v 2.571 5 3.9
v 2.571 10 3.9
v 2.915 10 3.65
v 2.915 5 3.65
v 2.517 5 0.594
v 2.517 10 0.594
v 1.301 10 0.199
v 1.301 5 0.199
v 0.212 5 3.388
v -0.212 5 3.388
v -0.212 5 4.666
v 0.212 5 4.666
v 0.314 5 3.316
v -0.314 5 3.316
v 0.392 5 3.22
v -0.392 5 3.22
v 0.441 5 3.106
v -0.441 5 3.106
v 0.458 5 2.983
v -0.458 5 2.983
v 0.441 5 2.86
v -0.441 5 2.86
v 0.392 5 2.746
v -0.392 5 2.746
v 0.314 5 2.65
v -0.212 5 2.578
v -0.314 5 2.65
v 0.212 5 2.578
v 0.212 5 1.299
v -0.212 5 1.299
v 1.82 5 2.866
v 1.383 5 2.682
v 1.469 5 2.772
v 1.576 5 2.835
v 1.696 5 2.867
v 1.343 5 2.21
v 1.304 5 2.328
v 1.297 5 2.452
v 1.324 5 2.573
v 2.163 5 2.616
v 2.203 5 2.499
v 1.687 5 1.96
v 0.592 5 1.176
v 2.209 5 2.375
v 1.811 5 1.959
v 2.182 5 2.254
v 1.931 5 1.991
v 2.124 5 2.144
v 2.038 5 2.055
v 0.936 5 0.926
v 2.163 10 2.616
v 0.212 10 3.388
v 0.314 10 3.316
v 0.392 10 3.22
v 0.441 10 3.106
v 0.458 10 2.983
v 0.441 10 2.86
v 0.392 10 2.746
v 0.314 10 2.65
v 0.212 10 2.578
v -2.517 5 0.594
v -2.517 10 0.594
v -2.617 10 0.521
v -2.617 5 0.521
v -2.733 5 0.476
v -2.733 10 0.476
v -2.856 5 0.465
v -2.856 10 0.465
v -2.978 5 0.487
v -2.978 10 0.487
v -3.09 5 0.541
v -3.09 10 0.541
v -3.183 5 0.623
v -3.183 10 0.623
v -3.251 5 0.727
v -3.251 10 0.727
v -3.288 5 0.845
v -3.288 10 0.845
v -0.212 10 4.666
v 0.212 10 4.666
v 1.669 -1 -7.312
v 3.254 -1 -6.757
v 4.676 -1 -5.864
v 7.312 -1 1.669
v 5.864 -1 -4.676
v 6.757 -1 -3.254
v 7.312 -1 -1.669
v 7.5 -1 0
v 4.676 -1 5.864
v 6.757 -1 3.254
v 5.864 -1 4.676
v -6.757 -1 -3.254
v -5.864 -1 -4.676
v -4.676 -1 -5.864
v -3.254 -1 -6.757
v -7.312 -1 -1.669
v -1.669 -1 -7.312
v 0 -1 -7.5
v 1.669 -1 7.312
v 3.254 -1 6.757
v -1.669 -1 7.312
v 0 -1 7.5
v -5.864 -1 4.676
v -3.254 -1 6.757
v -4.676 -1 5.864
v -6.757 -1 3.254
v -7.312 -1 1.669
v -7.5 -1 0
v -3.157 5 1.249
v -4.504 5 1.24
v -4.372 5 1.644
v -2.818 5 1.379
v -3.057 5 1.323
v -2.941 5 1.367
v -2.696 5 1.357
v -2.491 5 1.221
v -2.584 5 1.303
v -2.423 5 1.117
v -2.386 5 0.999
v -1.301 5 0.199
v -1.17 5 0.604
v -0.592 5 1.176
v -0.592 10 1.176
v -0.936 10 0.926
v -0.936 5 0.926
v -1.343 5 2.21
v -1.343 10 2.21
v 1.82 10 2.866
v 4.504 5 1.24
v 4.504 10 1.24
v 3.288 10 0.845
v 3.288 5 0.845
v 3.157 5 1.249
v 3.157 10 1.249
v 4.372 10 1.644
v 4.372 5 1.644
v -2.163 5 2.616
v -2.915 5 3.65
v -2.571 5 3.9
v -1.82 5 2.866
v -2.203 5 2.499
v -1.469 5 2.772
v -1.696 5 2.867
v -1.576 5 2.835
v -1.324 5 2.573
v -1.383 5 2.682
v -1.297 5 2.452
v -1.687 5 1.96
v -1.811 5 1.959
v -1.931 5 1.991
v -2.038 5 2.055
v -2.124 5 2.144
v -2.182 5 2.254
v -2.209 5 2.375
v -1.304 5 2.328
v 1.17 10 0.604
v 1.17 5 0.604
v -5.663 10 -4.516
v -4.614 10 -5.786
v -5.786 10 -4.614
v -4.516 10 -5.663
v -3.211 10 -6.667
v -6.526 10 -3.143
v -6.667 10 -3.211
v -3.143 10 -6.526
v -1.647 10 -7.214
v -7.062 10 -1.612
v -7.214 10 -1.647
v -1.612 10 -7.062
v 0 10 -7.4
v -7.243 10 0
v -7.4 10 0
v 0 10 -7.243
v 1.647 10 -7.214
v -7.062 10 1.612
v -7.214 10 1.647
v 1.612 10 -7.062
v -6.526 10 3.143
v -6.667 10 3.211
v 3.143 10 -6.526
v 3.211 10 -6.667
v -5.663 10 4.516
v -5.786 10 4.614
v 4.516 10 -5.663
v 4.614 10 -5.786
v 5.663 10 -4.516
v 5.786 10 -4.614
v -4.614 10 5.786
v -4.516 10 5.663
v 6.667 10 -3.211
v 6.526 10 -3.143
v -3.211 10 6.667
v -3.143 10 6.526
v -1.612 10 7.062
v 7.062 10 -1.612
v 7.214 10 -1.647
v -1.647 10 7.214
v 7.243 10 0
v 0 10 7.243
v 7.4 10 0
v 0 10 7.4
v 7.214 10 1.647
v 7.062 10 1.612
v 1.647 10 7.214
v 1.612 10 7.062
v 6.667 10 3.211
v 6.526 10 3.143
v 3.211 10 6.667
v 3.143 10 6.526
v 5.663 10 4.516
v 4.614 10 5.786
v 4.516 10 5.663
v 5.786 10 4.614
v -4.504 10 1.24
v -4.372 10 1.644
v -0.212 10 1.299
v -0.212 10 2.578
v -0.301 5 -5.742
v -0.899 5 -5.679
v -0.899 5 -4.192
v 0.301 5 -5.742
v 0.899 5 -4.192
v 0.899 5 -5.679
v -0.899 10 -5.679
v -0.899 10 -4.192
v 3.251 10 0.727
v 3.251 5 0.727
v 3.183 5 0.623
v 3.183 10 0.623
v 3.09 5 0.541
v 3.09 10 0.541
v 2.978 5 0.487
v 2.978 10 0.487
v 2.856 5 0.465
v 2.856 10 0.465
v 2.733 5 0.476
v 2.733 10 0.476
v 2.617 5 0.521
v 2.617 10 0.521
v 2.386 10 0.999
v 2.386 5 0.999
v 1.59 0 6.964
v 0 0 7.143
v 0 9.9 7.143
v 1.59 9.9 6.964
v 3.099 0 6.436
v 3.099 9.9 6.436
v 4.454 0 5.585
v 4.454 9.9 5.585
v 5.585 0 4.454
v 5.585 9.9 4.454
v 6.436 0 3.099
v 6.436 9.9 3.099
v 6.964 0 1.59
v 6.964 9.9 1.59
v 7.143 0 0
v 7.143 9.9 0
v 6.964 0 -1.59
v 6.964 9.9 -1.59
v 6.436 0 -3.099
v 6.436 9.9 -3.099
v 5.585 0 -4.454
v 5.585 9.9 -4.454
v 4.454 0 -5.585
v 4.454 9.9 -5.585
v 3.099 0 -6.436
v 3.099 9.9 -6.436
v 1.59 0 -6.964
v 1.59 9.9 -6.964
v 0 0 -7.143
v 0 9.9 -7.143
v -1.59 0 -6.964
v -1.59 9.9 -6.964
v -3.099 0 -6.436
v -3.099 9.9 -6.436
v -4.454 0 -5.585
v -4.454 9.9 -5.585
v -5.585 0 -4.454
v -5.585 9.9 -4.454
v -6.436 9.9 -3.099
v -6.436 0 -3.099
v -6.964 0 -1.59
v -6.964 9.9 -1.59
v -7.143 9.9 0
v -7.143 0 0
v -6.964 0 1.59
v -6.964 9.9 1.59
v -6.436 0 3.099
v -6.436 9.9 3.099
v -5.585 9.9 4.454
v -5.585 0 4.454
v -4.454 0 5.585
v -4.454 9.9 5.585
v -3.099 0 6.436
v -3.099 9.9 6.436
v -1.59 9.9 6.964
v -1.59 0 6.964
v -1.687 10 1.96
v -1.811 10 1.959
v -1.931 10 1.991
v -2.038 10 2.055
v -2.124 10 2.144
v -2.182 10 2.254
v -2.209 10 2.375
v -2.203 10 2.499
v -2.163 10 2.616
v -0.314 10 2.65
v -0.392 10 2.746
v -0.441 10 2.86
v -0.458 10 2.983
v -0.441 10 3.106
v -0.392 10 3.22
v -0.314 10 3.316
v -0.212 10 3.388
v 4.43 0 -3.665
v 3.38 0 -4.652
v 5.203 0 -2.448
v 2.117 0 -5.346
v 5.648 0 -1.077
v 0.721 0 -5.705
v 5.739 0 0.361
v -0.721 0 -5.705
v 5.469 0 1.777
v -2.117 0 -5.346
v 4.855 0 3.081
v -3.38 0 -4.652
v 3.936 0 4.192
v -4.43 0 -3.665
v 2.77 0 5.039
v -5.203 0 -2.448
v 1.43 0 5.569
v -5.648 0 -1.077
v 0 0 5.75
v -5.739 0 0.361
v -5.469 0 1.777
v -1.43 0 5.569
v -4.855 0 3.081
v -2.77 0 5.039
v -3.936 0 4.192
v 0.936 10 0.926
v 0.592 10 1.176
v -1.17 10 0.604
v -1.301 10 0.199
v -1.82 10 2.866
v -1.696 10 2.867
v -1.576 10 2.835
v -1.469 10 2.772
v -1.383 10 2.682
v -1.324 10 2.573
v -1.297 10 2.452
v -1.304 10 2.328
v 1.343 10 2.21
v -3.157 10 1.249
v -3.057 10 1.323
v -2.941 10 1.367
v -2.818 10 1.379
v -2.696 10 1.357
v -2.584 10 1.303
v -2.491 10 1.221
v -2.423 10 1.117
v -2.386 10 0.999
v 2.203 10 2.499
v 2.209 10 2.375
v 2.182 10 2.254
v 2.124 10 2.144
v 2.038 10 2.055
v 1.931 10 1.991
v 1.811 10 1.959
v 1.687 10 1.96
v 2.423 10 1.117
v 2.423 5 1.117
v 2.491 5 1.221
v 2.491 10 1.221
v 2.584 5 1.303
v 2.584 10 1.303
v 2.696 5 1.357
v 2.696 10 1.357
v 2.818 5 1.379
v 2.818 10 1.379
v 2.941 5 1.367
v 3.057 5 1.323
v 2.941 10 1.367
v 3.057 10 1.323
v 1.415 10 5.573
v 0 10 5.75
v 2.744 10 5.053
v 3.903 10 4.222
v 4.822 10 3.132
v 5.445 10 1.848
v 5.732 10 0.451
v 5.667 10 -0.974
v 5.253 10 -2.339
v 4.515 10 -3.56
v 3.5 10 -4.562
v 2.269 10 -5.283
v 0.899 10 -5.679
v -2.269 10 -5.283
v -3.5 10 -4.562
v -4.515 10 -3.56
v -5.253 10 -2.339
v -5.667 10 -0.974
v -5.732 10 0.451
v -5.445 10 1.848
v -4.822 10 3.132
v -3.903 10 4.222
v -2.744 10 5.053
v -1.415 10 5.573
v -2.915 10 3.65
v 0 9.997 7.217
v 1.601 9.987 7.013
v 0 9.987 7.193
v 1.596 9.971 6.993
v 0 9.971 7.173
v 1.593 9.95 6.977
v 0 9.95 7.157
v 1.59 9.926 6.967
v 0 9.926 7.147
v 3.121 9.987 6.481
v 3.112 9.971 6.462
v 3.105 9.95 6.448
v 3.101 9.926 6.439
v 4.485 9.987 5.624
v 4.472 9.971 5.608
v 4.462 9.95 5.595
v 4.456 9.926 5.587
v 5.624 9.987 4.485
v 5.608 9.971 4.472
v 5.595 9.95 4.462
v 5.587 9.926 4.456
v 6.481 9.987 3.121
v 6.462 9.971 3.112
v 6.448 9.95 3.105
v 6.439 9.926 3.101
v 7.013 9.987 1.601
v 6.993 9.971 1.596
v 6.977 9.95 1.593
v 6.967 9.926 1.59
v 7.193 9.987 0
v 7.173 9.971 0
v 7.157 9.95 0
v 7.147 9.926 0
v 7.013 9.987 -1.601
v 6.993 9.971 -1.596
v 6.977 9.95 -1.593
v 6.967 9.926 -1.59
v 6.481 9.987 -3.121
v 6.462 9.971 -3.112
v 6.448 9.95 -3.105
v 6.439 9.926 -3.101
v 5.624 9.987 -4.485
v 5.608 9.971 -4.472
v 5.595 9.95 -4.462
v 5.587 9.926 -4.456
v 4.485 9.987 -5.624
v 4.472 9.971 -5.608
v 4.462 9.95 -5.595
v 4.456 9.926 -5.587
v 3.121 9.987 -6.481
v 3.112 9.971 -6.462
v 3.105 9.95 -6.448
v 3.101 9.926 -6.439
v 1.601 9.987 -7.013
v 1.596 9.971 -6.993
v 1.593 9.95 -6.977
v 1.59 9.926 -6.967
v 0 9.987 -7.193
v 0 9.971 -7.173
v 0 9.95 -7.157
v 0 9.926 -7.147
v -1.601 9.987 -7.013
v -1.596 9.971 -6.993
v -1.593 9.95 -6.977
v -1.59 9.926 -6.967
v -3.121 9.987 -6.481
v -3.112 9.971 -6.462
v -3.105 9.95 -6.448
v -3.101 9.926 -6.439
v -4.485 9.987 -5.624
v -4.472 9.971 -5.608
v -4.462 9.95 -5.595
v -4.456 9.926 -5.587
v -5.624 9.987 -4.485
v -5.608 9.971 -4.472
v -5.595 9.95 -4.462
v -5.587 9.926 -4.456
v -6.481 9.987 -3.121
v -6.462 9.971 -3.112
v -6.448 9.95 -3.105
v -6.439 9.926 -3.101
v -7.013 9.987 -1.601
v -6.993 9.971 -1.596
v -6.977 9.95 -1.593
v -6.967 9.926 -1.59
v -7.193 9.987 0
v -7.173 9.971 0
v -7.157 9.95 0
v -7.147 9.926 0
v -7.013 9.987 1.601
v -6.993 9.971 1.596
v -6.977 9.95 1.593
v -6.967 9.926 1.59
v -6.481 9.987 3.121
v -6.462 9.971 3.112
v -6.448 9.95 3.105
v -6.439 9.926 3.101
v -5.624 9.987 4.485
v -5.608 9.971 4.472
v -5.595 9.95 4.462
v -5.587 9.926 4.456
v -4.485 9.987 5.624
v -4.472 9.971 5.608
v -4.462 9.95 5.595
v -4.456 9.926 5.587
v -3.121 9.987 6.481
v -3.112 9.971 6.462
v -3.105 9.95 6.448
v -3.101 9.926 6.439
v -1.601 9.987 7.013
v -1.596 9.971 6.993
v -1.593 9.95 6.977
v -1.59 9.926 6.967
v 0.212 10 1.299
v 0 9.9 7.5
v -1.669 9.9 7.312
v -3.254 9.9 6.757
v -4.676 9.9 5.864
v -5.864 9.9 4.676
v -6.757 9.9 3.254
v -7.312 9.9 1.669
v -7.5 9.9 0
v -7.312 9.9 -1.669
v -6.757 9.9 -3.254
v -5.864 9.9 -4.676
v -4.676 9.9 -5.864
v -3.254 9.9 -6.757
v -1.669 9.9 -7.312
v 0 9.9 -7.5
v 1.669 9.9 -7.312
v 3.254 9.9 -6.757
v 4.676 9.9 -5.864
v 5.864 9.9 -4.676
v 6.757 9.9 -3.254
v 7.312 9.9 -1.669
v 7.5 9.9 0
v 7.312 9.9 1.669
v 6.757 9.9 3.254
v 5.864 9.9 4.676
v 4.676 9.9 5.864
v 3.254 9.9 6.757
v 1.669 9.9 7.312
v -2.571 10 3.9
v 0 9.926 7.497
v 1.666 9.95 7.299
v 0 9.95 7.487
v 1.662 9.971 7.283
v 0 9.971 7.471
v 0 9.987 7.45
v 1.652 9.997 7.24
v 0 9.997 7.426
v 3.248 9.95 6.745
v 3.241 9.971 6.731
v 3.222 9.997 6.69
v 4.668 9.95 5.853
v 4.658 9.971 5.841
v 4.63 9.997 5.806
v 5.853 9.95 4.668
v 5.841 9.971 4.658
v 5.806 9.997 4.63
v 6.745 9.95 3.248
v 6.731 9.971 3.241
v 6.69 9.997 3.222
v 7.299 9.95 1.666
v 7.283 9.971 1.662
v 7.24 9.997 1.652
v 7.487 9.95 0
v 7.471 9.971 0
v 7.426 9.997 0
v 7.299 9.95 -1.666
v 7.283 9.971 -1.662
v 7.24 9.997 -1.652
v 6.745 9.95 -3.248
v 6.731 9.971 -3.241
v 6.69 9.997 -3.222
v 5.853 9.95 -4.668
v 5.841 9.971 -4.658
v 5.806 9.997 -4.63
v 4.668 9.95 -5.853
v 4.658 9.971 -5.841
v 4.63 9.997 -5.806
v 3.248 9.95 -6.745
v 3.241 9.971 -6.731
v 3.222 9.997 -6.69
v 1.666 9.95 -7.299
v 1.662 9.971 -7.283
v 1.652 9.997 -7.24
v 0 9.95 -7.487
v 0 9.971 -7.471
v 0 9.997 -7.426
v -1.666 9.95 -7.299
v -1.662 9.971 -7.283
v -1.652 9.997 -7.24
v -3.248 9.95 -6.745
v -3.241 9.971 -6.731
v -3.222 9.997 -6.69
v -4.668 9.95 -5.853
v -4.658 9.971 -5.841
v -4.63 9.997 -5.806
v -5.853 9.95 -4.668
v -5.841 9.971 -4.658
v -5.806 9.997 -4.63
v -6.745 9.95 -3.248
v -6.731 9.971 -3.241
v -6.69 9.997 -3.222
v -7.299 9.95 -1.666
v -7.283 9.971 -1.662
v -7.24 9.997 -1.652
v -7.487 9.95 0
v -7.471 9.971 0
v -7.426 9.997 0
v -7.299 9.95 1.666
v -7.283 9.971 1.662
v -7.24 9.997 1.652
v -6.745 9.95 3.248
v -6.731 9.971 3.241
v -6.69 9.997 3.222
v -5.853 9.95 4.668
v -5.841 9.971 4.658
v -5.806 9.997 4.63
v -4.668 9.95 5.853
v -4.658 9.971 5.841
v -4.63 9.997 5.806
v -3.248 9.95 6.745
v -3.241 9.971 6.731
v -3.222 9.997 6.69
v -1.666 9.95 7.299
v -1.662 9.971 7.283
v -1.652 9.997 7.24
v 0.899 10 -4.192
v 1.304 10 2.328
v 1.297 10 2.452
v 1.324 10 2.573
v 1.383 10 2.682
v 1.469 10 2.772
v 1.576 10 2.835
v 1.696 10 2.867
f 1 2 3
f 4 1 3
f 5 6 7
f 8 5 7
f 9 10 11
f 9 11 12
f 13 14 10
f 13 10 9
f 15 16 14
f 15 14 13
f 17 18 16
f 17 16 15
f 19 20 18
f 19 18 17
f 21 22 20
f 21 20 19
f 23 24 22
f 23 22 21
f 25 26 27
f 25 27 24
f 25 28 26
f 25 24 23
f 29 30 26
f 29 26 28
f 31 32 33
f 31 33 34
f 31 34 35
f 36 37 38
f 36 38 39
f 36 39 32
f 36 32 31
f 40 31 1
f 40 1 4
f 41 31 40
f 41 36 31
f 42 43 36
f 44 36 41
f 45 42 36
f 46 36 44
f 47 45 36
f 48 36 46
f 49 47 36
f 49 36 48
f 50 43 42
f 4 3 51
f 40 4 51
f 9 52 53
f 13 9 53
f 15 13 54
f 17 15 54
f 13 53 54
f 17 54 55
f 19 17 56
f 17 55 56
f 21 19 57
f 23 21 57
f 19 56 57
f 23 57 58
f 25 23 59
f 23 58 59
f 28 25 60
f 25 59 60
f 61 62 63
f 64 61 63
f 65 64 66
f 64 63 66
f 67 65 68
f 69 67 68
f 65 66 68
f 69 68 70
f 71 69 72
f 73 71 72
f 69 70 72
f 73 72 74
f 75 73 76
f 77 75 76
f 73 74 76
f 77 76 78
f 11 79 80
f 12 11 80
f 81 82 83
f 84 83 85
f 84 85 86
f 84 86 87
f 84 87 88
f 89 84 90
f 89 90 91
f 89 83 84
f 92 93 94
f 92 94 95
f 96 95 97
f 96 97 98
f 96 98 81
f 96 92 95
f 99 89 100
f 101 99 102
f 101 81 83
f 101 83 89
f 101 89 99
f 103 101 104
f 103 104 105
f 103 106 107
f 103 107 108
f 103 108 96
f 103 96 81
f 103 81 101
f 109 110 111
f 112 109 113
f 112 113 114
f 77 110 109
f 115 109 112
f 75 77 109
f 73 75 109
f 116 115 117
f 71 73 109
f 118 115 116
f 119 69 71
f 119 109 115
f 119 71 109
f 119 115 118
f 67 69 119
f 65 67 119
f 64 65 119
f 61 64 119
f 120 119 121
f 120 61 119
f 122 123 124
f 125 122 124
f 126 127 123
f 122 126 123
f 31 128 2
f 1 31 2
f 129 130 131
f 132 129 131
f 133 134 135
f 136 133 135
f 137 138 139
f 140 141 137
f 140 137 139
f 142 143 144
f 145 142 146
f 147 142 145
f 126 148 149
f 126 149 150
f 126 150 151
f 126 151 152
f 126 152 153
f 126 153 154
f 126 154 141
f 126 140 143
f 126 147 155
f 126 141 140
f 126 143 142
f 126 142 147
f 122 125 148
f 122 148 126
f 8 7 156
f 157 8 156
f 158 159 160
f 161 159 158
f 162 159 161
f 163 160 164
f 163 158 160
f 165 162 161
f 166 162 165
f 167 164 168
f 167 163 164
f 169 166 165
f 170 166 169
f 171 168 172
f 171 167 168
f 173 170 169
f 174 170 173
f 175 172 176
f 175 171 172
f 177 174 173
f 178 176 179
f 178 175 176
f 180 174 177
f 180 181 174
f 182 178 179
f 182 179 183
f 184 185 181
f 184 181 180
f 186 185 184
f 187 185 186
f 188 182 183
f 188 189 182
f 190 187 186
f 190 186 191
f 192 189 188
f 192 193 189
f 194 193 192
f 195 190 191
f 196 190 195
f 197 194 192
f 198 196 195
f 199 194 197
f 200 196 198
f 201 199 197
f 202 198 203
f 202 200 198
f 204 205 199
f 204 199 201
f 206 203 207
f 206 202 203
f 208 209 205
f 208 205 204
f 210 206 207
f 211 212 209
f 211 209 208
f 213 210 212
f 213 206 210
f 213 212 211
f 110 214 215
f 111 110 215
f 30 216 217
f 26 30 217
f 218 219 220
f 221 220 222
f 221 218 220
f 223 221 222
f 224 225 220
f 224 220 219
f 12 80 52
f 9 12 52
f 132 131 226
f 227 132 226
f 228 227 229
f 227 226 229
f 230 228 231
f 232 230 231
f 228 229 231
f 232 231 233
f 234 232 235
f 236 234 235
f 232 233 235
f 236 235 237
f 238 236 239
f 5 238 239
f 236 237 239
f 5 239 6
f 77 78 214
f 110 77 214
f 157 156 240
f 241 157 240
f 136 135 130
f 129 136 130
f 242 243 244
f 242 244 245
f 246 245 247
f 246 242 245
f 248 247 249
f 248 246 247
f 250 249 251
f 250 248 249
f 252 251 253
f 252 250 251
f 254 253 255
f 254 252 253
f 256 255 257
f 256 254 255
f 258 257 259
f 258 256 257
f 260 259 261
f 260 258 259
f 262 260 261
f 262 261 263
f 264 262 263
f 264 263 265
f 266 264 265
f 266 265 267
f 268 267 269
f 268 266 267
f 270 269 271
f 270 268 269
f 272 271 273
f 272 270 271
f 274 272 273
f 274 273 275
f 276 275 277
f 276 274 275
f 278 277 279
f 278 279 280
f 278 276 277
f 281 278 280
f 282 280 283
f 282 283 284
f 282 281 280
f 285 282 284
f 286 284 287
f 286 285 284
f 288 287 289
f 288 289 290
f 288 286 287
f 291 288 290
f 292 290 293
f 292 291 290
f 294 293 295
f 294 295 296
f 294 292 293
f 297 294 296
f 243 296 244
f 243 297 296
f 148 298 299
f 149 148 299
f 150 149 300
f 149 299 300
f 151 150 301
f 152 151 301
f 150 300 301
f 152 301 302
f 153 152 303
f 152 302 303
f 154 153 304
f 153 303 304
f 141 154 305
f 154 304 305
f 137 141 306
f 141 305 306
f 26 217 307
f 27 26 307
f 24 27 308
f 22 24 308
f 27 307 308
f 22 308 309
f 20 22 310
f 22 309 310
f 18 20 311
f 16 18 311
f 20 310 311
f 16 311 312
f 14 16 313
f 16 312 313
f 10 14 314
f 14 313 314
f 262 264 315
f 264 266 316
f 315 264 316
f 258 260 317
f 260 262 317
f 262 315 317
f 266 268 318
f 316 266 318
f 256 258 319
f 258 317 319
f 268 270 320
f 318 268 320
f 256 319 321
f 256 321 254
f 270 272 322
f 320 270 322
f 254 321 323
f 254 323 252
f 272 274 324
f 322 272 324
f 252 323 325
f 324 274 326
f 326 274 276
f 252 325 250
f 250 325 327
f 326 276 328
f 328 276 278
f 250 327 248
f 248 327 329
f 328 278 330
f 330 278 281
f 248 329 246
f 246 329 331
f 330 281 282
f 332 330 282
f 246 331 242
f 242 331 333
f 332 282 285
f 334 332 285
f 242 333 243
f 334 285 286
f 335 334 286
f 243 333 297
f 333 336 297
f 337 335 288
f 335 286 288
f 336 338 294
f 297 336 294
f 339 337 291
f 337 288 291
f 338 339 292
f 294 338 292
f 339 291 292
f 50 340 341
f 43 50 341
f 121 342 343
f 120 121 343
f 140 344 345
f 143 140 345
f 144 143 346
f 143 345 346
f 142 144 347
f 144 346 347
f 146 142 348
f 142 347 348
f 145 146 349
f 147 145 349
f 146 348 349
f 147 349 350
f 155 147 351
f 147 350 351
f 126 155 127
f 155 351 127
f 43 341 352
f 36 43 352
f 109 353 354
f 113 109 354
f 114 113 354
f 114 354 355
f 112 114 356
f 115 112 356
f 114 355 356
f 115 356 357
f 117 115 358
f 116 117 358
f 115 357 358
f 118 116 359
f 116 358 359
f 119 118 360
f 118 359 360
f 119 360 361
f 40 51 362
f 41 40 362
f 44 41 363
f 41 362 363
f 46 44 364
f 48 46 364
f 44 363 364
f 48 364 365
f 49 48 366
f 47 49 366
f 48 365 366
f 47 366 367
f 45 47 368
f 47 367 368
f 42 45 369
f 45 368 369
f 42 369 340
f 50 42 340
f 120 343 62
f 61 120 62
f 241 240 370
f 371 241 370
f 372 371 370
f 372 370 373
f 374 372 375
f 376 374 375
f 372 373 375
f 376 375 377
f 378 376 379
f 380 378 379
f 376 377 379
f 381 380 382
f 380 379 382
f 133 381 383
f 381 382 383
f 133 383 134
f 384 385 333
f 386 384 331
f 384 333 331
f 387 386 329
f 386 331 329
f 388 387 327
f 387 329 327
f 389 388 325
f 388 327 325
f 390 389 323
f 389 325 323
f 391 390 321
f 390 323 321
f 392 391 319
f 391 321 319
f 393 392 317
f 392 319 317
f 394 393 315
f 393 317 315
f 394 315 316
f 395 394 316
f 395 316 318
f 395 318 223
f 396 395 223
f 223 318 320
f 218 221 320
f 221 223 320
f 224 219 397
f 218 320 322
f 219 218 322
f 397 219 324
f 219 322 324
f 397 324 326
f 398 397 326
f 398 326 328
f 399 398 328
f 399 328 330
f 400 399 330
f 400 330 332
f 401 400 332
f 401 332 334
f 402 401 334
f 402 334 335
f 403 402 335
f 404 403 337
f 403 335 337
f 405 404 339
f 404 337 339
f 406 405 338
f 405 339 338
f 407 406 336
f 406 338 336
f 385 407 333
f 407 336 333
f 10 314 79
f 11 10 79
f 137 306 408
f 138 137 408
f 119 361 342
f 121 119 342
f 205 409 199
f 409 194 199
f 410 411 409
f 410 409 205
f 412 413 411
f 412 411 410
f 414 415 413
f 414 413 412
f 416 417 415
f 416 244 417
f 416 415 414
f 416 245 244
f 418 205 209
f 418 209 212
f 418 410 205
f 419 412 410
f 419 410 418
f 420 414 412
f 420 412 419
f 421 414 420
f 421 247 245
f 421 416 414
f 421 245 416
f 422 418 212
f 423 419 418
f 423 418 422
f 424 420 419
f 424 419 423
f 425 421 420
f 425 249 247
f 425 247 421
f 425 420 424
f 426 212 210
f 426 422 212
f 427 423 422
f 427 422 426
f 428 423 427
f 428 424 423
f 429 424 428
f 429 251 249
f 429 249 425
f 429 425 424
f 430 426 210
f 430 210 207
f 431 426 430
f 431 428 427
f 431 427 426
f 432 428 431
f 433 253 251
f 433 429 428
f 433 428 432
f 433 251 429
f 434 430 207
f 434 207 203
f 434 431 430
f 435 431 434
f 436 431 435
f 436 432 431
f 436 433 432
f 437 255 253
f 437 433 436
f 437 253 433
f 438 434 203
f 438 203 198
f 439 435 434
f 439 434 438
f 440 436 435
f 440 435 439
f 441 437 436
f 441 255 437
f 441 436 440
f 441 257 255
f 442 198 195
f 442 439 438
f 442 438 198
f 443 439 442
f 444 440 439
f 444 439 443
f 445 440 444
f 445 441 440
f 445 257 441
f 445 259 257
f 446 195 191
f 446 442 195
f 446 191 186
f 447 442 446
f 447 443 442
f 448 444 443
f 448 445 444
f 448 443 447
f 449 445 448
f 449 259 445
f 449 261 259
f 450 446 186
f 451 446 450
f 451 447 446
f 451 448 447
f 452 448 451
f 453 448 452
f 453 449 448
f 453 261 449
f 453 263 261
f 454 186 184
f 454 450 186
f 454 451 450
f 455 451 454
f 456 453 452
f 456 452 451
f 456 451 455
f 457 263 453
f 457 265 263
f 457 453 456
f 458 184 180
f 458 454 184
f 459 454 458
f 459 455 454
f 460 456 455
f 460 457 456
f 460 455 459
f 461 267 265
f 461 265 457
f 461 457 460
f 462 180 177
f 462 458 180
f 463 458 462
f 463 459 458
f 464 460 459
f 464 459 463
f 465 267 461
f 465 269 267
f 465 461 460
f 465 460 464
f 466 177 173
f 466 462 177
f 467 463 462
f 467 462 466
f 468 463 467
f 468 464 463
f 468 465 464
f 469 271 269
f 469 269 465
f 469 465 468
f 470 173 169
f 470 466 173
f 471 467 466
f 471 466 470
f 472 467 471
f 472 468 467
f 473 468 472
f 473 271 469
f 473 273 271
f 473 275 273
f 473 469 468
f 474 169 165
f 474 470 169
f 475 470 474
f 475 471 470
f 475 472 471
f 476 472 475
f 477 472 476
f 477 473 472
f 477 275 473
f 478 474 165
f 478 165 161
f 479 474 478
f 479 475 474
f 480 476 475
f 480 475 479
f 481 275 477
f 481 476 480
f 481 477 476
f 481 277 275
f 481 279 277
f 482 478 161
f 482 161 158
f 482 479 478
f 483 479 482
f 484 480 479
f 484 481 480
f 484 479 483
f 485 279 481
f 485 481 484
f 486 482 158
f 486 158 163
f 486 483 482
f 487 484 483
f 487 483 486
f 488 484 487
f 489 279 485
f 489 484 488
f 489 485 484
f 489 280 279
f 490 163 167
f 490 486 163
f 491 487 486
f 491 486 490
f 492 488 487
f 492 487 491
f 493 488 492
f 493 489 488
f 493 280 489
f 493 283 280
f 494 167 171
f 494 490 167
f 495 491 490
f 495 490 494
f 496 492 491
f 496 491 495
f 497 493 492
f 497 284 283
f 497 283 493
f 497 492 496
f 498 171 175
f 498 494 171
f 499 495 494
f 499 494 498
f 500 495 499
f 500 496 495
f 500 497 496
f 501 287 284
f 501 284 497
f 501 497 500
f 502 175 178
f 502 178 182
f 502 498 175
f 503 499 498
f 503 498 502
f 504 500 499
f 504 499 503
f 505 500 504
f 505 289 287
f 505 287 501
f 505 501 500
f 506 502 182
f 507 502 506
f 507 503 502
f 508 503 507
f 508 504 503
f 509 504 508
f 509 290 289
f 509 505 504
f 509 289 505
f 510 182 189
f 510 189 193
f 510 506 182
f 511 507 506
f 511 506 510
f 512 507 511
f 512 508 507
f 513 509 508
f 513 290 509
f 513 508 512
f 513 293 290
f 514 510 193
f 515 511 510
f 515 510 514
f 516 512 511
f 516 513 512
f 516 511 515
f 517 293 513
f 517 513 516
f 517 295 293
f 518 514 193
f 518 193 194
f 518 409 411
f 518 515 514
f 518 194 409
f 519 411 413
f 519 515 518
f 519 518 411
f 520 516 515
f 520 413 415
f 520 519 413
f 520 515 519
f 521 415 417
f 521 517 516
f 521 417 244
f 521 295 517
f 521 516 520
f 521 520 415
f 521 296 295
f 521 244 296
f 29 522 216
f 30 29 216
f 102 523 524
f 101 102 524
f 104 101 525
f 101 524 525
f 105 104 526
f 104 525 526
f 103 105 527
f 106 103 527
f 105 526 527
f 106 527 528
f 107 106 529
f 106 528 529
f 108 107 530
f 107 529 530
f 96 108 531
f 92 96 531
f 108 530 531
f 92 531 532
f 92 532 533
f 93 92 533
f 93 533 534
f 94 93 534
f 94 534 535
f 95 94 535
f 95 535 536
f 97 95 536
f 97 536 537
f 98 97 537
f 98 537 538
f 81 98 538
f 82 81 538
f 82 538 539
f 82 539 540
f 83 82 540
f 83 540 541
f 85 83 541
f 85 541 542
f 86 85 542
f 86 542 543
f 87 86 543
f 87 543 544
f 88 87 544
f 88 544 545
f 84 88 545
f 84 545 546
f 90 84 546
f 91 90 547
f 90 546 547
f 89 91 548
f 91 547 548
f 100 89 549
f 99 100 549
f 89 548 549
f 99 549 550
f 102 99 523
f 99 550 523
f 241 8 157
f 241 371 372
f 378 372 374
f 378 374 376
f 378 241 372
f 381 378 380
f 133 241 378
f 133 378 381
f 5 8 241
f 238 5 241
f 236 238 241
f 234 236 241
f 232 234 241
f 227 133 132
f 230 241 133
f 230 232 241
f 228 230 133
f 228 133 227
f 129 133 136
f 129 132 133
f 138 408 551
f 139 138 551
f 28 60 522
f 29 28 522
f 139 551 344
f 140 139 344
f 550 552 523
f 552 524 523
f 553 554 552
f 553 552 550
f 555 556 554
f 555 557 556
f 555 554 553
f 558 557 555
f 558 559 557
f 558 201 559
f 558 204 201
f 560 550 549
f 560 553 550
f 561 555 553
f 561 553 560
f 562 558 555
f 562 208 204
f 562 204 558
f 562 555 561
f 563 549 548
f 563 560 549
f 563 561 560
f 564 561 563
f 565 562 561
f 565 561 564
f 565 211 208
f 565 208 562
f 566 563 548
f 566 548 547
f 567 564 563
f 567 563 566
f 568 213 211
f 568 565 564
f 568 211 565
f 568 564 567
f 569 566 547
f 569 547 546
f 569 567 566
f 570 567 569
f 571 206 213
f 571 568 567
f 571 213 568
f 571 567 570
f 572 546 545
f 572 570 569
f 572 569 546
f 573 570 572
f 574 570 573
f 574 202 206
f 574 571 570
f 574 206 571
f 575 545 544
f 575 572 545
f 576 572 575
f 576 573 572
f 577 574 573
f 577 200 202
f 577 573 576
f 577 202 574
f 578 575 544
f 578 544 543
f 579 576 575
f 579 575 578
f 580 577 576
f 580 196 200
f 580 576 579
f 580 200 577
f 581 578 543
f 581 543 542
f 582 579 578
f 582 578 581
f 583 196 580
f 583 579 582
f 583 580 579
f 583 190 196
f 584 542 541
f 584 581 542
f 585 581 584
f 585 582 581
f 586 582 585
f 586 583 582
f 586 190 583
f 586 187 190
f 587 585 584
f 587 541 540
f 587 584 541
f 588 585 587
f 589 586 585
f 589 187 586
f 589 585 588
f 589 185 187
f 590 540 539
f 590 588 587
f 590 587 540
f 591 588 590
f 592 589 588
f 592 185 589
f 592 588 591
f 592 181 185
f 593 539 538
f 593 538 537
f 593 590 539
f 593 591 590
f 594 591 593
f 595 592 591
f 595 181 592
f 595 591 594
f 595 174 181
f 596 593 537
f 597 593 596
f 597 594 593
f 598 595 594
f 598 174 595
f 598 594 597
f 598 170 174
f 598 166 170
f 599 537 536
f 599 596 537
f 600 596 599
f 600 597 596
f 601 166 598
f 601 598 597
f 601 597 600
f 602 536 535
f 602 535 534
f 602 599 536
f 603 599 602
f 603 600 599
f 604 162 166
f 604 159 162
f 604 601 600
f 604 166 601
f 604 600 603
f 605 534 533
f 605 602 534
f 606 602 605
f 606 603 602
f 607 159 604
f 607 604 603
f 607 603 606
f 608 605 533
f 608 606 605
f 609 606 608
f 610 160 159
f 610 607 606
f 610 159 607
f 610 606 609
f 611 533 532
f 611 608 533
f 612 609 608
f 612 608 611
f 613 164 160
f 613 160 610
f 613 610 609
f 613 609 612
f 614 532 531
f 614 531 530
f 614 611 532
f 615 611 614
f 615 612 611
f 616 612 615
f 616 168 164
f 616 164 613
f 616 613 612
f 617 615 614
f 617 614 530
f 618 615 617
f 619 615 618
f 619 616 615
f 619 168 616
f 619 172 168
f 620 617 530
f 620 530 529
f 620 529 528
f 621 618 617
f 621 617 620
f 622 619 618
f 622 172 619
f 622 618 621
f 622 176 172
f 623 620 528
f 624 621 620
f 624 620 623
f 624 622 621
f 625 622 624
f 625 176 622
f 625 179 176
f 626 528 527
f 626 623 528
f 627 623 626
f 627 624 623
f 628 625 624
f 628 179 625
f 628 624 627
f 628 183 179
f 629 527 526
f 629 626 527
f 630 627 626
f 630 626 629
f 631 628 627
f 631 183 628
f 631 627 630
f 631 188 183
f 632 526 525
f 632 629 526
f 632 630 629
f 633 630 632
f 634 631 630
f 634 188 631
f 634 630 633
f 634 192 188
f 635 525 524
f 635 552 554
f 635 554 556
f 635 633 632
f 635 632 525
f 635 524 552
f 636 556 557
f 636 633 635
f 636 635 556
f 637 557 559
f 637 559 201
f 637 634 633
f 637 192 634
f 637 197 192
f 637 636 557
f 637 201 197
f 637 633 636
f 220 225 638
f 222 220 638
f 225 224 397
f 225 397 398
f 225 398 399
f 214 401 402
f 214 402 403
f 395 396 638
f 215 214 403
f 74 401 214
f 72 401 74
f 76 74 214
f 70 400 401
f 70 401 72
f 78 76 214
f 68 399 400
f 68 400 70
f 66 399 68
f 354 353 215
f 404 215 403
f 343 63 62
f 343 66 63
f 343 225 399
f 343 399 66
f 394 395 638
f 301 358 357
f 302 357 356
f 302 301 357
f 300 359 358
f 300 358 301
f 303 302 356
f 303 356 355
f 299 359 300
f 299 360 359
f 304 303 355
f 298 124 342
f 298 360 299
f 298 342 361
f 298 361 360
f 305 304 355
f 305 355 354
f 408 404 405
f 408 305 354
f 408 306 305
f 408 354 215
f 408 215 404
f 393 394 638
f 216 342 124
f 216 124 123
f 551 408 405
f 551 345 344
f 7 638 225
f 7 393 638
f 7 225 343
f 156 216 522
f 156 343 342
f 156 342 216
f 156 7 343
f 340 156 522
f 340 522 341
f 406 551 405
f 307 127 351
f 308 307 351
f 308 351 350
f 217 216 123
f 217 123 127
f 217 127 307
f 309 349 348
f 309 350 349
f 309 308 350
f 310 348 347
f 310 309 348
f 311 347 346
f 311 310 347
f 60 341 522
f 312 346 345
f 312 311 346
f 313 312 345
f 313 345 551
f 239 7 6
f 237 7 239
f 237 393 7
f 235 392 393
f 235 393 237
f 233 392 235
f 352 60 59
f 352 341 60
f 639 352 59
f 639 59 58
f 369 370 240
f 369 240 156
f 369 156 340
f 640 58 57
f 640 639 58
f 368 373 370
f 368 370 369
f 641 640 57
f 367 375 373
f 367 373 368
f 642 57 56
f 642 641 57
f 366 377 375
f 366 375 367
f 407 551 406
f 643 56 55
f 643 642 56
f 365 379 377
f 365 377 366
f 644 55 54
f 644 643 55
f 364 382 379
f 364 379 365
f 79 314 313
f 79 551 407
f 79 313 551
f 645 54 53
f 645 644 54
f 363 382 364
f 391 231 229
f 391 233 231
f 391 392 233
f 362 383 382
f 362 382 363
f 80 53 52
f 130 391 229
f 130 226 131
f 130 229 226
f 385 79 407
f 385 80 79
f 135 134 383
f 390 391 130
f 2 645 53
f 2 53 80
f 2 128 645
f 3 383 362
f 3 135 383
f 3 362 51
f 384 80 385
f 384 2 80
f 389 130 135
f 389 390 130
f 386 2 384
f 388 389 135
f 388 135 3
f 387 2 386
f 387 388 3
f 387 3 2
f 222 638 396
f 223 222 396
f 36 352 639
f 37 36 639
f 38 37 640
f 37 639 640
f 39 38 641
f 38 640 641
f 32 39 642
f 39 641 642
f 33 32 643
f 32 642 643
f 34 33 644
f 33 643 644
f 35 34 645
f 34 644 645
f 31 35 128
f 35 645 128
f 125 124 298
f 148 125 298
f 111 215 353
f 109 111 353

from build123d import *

# Parameters (mm, degrees)
SKETCH_1_R          = 5.75
EXTRUDE_1_DEPTH     = 10
SKETCH_2_W          = 1.797928006
SKETCH_2_H          = 1.699859207
CUT_EXTRUDE_1_DEPTH = 5
SKETCH_3_R          = 7.5
SKETCH_3_R_2        = 7.143263017
EXTRUDE_2_DEPTH     = 10
SKETCH_4_R          = 7.5
EXTRUDE_3_DEPTH     = 1
FILLET_2_R          = 0.1


with BuildPart() as part:
    # 草图1 → 凸台-拉伸1 (new body)
    with BuildSketch(Plane(origin=(0, 0, 0), x_dir=(1, 0, 0), z_dir=(0, 1, 0))):
        with Locations(Location((0, 0, 0), (0, 0, 270))):
            Circle(SKETCH_1_R)
    extrude(amount=EXTRUDE_1_DEPTH)

    # 草图2 → 切除-拉伸1 (cut)
    with BuildSketch(Plane(origin=(0, 10, 0), x_dir=(1, 0, 0), z_dir=(0, 1, 0))):
        with BuildLine():
            Line((0.212482401, -2.577588151), (0.212482401, -1.299411605))
            Line((0.212482401, -1.299411605), (-0.212482401, -1.299411605))
            Line((-0.212482401, -1.299411605), (-0.212482401, -2.577588151))
            ThreePointArc((-0.212482401, -2.577588151), (-0.457654402, -2.982926011), (-0.212482401, -3.388263872))
            Line((-0.212482401, -3.388263872), (-0.212482401, -4.666440418))
            Line((-0.212482401, -4.666440418), (0.212482401, -4.666440418))
            Line((0.212482401, -4.666440418), (0.212482401, -3.388263872))
            ThreePointArc((0.212482401, -3.388263872), (0.457654402, -2.982926011), (0.212482401, -2.577588151))
        make_face()
        with Locations((0, 5.04237082)):
            Rectangle(SKETCH_2_W, SKETCH_2_H)
        with BuildLine():
            Line((-1.343166429, -2.210206641), (-0.591873105, -1.176140093))
            Line((-0.591873105, -1.176140093), (-0.935676851, -0.92635205))
            Line((-0.935676851, -0.92635205), (-1.686970175, -1.960418597))
            ThreePointArc((-1.686970175, -1.960418597), (-2.123570107, -2.144235328), (-2.163473408, -2.616269032))
            Line((-2.163473408, -2.616269032), (-2.914766732, -3.65033558))
            Line((-2.914766732, -3.65033558), (-2.570962985, -3.900123623))
            Line((-2.570962985, -3.900123623), (-1.819669661, -2.866057075))
            ThreePointArc((-1.819669661, -2.866057075), (-1.38306973, -2.682240344), (-1.343166429, -2.210206641))
        make_face()
        with BuildLine():
            Line((-2.385771335, -0.998601315), (-1.170153201, -0.603623041))
            Line((-1.170153201, -0.603623041), (-1.301474547, -0.199457497))
            Line((-1.301474547, -0.199457497), (-2.517092681, -0.594435771))
            ThreePointArc((-2.517092681, -0.594435771), (-2.978354209, -0.48651963), (-3.288091107, -0.844948346))
            Line((-3.288091107, -0.844948346), (-4.50370924, -1.23992662))
            Line((-4.50370924, -1.23992662), (-4.372387895, -1.644092164))
            Line((-4.372387895, -1.644092164), (-3.156769761, -1.24911389))
            ThreePointArc((-3.156769761, -1.24911389), (-2.695508233, -1.357030032), (-2.385771335, -0.998601315))
        make_face()
        with BuildLine():
            Line((2.517092681, -0.594435771), (1.301474547, -0.199457497))
            Line((1.301474547, -0.199457497), (1.170153201, -0.603623041))
            Line((1.170153201, -0.603623041), (2.385771335, -0.998601315))
            ThreePointArc((2.385771335, -0.998601315), (2.695508233, -1.357030032), (3.156769761, -1.24911389))
            Line((3.156769761, -1.24911389), (4.372387895, -1.644092164))
            Line((4.372387895, -1.644092164), (4.50370924, -1.23992662))
            Line((4.50370924, -1.23992662), (3.288091107, -0.844948346))
            ThreePointArc((3.288091107, -0.844948346), (2.978354209, -0.48651963), (2.517092681, -0.594435771))
        make_face()
        with BuildLine():
            Line((1.686970175, -1.960418597), (0.935676851, -0.92635205))
            Line((0.935676851, -0.92635205), (0.591873105, -1.176140093))
            Line((0.591873105, -1.176140093), (1.343166429, -2.210206641))
            ThreePointArc((1.343166429, -2.210206641), (1.38306973, -2.682240344), (1.819669661, -2.866057075))
            Line((1.819669661, -2.866057075), (2.570962985, -3.900123623))
            Line((2.570962985, -3.900123623), (2.914766732, -3.65033558))
            Line((2.914766732, -3.65033558), (2.163473408, -2.616269032))
            ThreePointArc((2.163473408, -2.616269032), (2.123570107, -2.144235328), (1.686970175, -1.960418597))
        make_face()
    extrude(amount=-CUT_EXTRUDE_1_DEPTH, mode=Mode.SUBTRACT)



with BuildPart() as body_2:
    # 草图3 → 凸台-拉伸2 (new body)
    with BuildSketch(Plane(origin=(0, 0, 0), x_dir=(1, 0, 0), z_dir=(0, 1, 0))):
        with Locations(Location((0, 0, 0), (0, 0, 270))):
            Circle(SKETCH_3_R)
        with Locations(Location((0, 0, 0), (0, 0, 270))):
            Circle(SKETCH_3_R_2, mode=Mode.SUBTRACT)
    extrude(amount=EXTRUDE_2_DEPTH)


with BuildPart() as part_1:
    add(part.part)

    add(body_2.part)  # 凸台-拉伸3 merges body 2
    # 草图4 → 凸台-拉伸3 (add)
    with BuildSketch(Plane.XZ):
        with Locations(Location((0, 0, 0), (0, 0, 90))):
            Circle(SKETCH_4_R)
    extrude(amount=EXTRUDE_3_DEPTH)

    # 圆角2
    fillet_2_edges = [part_1.edges().sort_by_distance(p)[0] for p in [
        (0, 10, -7.5),
        (0, 10, -7.143263017),
    ]]
    fillet(fillet_2_edges, radius=FILLET_2_R)


solid = part_1.part
